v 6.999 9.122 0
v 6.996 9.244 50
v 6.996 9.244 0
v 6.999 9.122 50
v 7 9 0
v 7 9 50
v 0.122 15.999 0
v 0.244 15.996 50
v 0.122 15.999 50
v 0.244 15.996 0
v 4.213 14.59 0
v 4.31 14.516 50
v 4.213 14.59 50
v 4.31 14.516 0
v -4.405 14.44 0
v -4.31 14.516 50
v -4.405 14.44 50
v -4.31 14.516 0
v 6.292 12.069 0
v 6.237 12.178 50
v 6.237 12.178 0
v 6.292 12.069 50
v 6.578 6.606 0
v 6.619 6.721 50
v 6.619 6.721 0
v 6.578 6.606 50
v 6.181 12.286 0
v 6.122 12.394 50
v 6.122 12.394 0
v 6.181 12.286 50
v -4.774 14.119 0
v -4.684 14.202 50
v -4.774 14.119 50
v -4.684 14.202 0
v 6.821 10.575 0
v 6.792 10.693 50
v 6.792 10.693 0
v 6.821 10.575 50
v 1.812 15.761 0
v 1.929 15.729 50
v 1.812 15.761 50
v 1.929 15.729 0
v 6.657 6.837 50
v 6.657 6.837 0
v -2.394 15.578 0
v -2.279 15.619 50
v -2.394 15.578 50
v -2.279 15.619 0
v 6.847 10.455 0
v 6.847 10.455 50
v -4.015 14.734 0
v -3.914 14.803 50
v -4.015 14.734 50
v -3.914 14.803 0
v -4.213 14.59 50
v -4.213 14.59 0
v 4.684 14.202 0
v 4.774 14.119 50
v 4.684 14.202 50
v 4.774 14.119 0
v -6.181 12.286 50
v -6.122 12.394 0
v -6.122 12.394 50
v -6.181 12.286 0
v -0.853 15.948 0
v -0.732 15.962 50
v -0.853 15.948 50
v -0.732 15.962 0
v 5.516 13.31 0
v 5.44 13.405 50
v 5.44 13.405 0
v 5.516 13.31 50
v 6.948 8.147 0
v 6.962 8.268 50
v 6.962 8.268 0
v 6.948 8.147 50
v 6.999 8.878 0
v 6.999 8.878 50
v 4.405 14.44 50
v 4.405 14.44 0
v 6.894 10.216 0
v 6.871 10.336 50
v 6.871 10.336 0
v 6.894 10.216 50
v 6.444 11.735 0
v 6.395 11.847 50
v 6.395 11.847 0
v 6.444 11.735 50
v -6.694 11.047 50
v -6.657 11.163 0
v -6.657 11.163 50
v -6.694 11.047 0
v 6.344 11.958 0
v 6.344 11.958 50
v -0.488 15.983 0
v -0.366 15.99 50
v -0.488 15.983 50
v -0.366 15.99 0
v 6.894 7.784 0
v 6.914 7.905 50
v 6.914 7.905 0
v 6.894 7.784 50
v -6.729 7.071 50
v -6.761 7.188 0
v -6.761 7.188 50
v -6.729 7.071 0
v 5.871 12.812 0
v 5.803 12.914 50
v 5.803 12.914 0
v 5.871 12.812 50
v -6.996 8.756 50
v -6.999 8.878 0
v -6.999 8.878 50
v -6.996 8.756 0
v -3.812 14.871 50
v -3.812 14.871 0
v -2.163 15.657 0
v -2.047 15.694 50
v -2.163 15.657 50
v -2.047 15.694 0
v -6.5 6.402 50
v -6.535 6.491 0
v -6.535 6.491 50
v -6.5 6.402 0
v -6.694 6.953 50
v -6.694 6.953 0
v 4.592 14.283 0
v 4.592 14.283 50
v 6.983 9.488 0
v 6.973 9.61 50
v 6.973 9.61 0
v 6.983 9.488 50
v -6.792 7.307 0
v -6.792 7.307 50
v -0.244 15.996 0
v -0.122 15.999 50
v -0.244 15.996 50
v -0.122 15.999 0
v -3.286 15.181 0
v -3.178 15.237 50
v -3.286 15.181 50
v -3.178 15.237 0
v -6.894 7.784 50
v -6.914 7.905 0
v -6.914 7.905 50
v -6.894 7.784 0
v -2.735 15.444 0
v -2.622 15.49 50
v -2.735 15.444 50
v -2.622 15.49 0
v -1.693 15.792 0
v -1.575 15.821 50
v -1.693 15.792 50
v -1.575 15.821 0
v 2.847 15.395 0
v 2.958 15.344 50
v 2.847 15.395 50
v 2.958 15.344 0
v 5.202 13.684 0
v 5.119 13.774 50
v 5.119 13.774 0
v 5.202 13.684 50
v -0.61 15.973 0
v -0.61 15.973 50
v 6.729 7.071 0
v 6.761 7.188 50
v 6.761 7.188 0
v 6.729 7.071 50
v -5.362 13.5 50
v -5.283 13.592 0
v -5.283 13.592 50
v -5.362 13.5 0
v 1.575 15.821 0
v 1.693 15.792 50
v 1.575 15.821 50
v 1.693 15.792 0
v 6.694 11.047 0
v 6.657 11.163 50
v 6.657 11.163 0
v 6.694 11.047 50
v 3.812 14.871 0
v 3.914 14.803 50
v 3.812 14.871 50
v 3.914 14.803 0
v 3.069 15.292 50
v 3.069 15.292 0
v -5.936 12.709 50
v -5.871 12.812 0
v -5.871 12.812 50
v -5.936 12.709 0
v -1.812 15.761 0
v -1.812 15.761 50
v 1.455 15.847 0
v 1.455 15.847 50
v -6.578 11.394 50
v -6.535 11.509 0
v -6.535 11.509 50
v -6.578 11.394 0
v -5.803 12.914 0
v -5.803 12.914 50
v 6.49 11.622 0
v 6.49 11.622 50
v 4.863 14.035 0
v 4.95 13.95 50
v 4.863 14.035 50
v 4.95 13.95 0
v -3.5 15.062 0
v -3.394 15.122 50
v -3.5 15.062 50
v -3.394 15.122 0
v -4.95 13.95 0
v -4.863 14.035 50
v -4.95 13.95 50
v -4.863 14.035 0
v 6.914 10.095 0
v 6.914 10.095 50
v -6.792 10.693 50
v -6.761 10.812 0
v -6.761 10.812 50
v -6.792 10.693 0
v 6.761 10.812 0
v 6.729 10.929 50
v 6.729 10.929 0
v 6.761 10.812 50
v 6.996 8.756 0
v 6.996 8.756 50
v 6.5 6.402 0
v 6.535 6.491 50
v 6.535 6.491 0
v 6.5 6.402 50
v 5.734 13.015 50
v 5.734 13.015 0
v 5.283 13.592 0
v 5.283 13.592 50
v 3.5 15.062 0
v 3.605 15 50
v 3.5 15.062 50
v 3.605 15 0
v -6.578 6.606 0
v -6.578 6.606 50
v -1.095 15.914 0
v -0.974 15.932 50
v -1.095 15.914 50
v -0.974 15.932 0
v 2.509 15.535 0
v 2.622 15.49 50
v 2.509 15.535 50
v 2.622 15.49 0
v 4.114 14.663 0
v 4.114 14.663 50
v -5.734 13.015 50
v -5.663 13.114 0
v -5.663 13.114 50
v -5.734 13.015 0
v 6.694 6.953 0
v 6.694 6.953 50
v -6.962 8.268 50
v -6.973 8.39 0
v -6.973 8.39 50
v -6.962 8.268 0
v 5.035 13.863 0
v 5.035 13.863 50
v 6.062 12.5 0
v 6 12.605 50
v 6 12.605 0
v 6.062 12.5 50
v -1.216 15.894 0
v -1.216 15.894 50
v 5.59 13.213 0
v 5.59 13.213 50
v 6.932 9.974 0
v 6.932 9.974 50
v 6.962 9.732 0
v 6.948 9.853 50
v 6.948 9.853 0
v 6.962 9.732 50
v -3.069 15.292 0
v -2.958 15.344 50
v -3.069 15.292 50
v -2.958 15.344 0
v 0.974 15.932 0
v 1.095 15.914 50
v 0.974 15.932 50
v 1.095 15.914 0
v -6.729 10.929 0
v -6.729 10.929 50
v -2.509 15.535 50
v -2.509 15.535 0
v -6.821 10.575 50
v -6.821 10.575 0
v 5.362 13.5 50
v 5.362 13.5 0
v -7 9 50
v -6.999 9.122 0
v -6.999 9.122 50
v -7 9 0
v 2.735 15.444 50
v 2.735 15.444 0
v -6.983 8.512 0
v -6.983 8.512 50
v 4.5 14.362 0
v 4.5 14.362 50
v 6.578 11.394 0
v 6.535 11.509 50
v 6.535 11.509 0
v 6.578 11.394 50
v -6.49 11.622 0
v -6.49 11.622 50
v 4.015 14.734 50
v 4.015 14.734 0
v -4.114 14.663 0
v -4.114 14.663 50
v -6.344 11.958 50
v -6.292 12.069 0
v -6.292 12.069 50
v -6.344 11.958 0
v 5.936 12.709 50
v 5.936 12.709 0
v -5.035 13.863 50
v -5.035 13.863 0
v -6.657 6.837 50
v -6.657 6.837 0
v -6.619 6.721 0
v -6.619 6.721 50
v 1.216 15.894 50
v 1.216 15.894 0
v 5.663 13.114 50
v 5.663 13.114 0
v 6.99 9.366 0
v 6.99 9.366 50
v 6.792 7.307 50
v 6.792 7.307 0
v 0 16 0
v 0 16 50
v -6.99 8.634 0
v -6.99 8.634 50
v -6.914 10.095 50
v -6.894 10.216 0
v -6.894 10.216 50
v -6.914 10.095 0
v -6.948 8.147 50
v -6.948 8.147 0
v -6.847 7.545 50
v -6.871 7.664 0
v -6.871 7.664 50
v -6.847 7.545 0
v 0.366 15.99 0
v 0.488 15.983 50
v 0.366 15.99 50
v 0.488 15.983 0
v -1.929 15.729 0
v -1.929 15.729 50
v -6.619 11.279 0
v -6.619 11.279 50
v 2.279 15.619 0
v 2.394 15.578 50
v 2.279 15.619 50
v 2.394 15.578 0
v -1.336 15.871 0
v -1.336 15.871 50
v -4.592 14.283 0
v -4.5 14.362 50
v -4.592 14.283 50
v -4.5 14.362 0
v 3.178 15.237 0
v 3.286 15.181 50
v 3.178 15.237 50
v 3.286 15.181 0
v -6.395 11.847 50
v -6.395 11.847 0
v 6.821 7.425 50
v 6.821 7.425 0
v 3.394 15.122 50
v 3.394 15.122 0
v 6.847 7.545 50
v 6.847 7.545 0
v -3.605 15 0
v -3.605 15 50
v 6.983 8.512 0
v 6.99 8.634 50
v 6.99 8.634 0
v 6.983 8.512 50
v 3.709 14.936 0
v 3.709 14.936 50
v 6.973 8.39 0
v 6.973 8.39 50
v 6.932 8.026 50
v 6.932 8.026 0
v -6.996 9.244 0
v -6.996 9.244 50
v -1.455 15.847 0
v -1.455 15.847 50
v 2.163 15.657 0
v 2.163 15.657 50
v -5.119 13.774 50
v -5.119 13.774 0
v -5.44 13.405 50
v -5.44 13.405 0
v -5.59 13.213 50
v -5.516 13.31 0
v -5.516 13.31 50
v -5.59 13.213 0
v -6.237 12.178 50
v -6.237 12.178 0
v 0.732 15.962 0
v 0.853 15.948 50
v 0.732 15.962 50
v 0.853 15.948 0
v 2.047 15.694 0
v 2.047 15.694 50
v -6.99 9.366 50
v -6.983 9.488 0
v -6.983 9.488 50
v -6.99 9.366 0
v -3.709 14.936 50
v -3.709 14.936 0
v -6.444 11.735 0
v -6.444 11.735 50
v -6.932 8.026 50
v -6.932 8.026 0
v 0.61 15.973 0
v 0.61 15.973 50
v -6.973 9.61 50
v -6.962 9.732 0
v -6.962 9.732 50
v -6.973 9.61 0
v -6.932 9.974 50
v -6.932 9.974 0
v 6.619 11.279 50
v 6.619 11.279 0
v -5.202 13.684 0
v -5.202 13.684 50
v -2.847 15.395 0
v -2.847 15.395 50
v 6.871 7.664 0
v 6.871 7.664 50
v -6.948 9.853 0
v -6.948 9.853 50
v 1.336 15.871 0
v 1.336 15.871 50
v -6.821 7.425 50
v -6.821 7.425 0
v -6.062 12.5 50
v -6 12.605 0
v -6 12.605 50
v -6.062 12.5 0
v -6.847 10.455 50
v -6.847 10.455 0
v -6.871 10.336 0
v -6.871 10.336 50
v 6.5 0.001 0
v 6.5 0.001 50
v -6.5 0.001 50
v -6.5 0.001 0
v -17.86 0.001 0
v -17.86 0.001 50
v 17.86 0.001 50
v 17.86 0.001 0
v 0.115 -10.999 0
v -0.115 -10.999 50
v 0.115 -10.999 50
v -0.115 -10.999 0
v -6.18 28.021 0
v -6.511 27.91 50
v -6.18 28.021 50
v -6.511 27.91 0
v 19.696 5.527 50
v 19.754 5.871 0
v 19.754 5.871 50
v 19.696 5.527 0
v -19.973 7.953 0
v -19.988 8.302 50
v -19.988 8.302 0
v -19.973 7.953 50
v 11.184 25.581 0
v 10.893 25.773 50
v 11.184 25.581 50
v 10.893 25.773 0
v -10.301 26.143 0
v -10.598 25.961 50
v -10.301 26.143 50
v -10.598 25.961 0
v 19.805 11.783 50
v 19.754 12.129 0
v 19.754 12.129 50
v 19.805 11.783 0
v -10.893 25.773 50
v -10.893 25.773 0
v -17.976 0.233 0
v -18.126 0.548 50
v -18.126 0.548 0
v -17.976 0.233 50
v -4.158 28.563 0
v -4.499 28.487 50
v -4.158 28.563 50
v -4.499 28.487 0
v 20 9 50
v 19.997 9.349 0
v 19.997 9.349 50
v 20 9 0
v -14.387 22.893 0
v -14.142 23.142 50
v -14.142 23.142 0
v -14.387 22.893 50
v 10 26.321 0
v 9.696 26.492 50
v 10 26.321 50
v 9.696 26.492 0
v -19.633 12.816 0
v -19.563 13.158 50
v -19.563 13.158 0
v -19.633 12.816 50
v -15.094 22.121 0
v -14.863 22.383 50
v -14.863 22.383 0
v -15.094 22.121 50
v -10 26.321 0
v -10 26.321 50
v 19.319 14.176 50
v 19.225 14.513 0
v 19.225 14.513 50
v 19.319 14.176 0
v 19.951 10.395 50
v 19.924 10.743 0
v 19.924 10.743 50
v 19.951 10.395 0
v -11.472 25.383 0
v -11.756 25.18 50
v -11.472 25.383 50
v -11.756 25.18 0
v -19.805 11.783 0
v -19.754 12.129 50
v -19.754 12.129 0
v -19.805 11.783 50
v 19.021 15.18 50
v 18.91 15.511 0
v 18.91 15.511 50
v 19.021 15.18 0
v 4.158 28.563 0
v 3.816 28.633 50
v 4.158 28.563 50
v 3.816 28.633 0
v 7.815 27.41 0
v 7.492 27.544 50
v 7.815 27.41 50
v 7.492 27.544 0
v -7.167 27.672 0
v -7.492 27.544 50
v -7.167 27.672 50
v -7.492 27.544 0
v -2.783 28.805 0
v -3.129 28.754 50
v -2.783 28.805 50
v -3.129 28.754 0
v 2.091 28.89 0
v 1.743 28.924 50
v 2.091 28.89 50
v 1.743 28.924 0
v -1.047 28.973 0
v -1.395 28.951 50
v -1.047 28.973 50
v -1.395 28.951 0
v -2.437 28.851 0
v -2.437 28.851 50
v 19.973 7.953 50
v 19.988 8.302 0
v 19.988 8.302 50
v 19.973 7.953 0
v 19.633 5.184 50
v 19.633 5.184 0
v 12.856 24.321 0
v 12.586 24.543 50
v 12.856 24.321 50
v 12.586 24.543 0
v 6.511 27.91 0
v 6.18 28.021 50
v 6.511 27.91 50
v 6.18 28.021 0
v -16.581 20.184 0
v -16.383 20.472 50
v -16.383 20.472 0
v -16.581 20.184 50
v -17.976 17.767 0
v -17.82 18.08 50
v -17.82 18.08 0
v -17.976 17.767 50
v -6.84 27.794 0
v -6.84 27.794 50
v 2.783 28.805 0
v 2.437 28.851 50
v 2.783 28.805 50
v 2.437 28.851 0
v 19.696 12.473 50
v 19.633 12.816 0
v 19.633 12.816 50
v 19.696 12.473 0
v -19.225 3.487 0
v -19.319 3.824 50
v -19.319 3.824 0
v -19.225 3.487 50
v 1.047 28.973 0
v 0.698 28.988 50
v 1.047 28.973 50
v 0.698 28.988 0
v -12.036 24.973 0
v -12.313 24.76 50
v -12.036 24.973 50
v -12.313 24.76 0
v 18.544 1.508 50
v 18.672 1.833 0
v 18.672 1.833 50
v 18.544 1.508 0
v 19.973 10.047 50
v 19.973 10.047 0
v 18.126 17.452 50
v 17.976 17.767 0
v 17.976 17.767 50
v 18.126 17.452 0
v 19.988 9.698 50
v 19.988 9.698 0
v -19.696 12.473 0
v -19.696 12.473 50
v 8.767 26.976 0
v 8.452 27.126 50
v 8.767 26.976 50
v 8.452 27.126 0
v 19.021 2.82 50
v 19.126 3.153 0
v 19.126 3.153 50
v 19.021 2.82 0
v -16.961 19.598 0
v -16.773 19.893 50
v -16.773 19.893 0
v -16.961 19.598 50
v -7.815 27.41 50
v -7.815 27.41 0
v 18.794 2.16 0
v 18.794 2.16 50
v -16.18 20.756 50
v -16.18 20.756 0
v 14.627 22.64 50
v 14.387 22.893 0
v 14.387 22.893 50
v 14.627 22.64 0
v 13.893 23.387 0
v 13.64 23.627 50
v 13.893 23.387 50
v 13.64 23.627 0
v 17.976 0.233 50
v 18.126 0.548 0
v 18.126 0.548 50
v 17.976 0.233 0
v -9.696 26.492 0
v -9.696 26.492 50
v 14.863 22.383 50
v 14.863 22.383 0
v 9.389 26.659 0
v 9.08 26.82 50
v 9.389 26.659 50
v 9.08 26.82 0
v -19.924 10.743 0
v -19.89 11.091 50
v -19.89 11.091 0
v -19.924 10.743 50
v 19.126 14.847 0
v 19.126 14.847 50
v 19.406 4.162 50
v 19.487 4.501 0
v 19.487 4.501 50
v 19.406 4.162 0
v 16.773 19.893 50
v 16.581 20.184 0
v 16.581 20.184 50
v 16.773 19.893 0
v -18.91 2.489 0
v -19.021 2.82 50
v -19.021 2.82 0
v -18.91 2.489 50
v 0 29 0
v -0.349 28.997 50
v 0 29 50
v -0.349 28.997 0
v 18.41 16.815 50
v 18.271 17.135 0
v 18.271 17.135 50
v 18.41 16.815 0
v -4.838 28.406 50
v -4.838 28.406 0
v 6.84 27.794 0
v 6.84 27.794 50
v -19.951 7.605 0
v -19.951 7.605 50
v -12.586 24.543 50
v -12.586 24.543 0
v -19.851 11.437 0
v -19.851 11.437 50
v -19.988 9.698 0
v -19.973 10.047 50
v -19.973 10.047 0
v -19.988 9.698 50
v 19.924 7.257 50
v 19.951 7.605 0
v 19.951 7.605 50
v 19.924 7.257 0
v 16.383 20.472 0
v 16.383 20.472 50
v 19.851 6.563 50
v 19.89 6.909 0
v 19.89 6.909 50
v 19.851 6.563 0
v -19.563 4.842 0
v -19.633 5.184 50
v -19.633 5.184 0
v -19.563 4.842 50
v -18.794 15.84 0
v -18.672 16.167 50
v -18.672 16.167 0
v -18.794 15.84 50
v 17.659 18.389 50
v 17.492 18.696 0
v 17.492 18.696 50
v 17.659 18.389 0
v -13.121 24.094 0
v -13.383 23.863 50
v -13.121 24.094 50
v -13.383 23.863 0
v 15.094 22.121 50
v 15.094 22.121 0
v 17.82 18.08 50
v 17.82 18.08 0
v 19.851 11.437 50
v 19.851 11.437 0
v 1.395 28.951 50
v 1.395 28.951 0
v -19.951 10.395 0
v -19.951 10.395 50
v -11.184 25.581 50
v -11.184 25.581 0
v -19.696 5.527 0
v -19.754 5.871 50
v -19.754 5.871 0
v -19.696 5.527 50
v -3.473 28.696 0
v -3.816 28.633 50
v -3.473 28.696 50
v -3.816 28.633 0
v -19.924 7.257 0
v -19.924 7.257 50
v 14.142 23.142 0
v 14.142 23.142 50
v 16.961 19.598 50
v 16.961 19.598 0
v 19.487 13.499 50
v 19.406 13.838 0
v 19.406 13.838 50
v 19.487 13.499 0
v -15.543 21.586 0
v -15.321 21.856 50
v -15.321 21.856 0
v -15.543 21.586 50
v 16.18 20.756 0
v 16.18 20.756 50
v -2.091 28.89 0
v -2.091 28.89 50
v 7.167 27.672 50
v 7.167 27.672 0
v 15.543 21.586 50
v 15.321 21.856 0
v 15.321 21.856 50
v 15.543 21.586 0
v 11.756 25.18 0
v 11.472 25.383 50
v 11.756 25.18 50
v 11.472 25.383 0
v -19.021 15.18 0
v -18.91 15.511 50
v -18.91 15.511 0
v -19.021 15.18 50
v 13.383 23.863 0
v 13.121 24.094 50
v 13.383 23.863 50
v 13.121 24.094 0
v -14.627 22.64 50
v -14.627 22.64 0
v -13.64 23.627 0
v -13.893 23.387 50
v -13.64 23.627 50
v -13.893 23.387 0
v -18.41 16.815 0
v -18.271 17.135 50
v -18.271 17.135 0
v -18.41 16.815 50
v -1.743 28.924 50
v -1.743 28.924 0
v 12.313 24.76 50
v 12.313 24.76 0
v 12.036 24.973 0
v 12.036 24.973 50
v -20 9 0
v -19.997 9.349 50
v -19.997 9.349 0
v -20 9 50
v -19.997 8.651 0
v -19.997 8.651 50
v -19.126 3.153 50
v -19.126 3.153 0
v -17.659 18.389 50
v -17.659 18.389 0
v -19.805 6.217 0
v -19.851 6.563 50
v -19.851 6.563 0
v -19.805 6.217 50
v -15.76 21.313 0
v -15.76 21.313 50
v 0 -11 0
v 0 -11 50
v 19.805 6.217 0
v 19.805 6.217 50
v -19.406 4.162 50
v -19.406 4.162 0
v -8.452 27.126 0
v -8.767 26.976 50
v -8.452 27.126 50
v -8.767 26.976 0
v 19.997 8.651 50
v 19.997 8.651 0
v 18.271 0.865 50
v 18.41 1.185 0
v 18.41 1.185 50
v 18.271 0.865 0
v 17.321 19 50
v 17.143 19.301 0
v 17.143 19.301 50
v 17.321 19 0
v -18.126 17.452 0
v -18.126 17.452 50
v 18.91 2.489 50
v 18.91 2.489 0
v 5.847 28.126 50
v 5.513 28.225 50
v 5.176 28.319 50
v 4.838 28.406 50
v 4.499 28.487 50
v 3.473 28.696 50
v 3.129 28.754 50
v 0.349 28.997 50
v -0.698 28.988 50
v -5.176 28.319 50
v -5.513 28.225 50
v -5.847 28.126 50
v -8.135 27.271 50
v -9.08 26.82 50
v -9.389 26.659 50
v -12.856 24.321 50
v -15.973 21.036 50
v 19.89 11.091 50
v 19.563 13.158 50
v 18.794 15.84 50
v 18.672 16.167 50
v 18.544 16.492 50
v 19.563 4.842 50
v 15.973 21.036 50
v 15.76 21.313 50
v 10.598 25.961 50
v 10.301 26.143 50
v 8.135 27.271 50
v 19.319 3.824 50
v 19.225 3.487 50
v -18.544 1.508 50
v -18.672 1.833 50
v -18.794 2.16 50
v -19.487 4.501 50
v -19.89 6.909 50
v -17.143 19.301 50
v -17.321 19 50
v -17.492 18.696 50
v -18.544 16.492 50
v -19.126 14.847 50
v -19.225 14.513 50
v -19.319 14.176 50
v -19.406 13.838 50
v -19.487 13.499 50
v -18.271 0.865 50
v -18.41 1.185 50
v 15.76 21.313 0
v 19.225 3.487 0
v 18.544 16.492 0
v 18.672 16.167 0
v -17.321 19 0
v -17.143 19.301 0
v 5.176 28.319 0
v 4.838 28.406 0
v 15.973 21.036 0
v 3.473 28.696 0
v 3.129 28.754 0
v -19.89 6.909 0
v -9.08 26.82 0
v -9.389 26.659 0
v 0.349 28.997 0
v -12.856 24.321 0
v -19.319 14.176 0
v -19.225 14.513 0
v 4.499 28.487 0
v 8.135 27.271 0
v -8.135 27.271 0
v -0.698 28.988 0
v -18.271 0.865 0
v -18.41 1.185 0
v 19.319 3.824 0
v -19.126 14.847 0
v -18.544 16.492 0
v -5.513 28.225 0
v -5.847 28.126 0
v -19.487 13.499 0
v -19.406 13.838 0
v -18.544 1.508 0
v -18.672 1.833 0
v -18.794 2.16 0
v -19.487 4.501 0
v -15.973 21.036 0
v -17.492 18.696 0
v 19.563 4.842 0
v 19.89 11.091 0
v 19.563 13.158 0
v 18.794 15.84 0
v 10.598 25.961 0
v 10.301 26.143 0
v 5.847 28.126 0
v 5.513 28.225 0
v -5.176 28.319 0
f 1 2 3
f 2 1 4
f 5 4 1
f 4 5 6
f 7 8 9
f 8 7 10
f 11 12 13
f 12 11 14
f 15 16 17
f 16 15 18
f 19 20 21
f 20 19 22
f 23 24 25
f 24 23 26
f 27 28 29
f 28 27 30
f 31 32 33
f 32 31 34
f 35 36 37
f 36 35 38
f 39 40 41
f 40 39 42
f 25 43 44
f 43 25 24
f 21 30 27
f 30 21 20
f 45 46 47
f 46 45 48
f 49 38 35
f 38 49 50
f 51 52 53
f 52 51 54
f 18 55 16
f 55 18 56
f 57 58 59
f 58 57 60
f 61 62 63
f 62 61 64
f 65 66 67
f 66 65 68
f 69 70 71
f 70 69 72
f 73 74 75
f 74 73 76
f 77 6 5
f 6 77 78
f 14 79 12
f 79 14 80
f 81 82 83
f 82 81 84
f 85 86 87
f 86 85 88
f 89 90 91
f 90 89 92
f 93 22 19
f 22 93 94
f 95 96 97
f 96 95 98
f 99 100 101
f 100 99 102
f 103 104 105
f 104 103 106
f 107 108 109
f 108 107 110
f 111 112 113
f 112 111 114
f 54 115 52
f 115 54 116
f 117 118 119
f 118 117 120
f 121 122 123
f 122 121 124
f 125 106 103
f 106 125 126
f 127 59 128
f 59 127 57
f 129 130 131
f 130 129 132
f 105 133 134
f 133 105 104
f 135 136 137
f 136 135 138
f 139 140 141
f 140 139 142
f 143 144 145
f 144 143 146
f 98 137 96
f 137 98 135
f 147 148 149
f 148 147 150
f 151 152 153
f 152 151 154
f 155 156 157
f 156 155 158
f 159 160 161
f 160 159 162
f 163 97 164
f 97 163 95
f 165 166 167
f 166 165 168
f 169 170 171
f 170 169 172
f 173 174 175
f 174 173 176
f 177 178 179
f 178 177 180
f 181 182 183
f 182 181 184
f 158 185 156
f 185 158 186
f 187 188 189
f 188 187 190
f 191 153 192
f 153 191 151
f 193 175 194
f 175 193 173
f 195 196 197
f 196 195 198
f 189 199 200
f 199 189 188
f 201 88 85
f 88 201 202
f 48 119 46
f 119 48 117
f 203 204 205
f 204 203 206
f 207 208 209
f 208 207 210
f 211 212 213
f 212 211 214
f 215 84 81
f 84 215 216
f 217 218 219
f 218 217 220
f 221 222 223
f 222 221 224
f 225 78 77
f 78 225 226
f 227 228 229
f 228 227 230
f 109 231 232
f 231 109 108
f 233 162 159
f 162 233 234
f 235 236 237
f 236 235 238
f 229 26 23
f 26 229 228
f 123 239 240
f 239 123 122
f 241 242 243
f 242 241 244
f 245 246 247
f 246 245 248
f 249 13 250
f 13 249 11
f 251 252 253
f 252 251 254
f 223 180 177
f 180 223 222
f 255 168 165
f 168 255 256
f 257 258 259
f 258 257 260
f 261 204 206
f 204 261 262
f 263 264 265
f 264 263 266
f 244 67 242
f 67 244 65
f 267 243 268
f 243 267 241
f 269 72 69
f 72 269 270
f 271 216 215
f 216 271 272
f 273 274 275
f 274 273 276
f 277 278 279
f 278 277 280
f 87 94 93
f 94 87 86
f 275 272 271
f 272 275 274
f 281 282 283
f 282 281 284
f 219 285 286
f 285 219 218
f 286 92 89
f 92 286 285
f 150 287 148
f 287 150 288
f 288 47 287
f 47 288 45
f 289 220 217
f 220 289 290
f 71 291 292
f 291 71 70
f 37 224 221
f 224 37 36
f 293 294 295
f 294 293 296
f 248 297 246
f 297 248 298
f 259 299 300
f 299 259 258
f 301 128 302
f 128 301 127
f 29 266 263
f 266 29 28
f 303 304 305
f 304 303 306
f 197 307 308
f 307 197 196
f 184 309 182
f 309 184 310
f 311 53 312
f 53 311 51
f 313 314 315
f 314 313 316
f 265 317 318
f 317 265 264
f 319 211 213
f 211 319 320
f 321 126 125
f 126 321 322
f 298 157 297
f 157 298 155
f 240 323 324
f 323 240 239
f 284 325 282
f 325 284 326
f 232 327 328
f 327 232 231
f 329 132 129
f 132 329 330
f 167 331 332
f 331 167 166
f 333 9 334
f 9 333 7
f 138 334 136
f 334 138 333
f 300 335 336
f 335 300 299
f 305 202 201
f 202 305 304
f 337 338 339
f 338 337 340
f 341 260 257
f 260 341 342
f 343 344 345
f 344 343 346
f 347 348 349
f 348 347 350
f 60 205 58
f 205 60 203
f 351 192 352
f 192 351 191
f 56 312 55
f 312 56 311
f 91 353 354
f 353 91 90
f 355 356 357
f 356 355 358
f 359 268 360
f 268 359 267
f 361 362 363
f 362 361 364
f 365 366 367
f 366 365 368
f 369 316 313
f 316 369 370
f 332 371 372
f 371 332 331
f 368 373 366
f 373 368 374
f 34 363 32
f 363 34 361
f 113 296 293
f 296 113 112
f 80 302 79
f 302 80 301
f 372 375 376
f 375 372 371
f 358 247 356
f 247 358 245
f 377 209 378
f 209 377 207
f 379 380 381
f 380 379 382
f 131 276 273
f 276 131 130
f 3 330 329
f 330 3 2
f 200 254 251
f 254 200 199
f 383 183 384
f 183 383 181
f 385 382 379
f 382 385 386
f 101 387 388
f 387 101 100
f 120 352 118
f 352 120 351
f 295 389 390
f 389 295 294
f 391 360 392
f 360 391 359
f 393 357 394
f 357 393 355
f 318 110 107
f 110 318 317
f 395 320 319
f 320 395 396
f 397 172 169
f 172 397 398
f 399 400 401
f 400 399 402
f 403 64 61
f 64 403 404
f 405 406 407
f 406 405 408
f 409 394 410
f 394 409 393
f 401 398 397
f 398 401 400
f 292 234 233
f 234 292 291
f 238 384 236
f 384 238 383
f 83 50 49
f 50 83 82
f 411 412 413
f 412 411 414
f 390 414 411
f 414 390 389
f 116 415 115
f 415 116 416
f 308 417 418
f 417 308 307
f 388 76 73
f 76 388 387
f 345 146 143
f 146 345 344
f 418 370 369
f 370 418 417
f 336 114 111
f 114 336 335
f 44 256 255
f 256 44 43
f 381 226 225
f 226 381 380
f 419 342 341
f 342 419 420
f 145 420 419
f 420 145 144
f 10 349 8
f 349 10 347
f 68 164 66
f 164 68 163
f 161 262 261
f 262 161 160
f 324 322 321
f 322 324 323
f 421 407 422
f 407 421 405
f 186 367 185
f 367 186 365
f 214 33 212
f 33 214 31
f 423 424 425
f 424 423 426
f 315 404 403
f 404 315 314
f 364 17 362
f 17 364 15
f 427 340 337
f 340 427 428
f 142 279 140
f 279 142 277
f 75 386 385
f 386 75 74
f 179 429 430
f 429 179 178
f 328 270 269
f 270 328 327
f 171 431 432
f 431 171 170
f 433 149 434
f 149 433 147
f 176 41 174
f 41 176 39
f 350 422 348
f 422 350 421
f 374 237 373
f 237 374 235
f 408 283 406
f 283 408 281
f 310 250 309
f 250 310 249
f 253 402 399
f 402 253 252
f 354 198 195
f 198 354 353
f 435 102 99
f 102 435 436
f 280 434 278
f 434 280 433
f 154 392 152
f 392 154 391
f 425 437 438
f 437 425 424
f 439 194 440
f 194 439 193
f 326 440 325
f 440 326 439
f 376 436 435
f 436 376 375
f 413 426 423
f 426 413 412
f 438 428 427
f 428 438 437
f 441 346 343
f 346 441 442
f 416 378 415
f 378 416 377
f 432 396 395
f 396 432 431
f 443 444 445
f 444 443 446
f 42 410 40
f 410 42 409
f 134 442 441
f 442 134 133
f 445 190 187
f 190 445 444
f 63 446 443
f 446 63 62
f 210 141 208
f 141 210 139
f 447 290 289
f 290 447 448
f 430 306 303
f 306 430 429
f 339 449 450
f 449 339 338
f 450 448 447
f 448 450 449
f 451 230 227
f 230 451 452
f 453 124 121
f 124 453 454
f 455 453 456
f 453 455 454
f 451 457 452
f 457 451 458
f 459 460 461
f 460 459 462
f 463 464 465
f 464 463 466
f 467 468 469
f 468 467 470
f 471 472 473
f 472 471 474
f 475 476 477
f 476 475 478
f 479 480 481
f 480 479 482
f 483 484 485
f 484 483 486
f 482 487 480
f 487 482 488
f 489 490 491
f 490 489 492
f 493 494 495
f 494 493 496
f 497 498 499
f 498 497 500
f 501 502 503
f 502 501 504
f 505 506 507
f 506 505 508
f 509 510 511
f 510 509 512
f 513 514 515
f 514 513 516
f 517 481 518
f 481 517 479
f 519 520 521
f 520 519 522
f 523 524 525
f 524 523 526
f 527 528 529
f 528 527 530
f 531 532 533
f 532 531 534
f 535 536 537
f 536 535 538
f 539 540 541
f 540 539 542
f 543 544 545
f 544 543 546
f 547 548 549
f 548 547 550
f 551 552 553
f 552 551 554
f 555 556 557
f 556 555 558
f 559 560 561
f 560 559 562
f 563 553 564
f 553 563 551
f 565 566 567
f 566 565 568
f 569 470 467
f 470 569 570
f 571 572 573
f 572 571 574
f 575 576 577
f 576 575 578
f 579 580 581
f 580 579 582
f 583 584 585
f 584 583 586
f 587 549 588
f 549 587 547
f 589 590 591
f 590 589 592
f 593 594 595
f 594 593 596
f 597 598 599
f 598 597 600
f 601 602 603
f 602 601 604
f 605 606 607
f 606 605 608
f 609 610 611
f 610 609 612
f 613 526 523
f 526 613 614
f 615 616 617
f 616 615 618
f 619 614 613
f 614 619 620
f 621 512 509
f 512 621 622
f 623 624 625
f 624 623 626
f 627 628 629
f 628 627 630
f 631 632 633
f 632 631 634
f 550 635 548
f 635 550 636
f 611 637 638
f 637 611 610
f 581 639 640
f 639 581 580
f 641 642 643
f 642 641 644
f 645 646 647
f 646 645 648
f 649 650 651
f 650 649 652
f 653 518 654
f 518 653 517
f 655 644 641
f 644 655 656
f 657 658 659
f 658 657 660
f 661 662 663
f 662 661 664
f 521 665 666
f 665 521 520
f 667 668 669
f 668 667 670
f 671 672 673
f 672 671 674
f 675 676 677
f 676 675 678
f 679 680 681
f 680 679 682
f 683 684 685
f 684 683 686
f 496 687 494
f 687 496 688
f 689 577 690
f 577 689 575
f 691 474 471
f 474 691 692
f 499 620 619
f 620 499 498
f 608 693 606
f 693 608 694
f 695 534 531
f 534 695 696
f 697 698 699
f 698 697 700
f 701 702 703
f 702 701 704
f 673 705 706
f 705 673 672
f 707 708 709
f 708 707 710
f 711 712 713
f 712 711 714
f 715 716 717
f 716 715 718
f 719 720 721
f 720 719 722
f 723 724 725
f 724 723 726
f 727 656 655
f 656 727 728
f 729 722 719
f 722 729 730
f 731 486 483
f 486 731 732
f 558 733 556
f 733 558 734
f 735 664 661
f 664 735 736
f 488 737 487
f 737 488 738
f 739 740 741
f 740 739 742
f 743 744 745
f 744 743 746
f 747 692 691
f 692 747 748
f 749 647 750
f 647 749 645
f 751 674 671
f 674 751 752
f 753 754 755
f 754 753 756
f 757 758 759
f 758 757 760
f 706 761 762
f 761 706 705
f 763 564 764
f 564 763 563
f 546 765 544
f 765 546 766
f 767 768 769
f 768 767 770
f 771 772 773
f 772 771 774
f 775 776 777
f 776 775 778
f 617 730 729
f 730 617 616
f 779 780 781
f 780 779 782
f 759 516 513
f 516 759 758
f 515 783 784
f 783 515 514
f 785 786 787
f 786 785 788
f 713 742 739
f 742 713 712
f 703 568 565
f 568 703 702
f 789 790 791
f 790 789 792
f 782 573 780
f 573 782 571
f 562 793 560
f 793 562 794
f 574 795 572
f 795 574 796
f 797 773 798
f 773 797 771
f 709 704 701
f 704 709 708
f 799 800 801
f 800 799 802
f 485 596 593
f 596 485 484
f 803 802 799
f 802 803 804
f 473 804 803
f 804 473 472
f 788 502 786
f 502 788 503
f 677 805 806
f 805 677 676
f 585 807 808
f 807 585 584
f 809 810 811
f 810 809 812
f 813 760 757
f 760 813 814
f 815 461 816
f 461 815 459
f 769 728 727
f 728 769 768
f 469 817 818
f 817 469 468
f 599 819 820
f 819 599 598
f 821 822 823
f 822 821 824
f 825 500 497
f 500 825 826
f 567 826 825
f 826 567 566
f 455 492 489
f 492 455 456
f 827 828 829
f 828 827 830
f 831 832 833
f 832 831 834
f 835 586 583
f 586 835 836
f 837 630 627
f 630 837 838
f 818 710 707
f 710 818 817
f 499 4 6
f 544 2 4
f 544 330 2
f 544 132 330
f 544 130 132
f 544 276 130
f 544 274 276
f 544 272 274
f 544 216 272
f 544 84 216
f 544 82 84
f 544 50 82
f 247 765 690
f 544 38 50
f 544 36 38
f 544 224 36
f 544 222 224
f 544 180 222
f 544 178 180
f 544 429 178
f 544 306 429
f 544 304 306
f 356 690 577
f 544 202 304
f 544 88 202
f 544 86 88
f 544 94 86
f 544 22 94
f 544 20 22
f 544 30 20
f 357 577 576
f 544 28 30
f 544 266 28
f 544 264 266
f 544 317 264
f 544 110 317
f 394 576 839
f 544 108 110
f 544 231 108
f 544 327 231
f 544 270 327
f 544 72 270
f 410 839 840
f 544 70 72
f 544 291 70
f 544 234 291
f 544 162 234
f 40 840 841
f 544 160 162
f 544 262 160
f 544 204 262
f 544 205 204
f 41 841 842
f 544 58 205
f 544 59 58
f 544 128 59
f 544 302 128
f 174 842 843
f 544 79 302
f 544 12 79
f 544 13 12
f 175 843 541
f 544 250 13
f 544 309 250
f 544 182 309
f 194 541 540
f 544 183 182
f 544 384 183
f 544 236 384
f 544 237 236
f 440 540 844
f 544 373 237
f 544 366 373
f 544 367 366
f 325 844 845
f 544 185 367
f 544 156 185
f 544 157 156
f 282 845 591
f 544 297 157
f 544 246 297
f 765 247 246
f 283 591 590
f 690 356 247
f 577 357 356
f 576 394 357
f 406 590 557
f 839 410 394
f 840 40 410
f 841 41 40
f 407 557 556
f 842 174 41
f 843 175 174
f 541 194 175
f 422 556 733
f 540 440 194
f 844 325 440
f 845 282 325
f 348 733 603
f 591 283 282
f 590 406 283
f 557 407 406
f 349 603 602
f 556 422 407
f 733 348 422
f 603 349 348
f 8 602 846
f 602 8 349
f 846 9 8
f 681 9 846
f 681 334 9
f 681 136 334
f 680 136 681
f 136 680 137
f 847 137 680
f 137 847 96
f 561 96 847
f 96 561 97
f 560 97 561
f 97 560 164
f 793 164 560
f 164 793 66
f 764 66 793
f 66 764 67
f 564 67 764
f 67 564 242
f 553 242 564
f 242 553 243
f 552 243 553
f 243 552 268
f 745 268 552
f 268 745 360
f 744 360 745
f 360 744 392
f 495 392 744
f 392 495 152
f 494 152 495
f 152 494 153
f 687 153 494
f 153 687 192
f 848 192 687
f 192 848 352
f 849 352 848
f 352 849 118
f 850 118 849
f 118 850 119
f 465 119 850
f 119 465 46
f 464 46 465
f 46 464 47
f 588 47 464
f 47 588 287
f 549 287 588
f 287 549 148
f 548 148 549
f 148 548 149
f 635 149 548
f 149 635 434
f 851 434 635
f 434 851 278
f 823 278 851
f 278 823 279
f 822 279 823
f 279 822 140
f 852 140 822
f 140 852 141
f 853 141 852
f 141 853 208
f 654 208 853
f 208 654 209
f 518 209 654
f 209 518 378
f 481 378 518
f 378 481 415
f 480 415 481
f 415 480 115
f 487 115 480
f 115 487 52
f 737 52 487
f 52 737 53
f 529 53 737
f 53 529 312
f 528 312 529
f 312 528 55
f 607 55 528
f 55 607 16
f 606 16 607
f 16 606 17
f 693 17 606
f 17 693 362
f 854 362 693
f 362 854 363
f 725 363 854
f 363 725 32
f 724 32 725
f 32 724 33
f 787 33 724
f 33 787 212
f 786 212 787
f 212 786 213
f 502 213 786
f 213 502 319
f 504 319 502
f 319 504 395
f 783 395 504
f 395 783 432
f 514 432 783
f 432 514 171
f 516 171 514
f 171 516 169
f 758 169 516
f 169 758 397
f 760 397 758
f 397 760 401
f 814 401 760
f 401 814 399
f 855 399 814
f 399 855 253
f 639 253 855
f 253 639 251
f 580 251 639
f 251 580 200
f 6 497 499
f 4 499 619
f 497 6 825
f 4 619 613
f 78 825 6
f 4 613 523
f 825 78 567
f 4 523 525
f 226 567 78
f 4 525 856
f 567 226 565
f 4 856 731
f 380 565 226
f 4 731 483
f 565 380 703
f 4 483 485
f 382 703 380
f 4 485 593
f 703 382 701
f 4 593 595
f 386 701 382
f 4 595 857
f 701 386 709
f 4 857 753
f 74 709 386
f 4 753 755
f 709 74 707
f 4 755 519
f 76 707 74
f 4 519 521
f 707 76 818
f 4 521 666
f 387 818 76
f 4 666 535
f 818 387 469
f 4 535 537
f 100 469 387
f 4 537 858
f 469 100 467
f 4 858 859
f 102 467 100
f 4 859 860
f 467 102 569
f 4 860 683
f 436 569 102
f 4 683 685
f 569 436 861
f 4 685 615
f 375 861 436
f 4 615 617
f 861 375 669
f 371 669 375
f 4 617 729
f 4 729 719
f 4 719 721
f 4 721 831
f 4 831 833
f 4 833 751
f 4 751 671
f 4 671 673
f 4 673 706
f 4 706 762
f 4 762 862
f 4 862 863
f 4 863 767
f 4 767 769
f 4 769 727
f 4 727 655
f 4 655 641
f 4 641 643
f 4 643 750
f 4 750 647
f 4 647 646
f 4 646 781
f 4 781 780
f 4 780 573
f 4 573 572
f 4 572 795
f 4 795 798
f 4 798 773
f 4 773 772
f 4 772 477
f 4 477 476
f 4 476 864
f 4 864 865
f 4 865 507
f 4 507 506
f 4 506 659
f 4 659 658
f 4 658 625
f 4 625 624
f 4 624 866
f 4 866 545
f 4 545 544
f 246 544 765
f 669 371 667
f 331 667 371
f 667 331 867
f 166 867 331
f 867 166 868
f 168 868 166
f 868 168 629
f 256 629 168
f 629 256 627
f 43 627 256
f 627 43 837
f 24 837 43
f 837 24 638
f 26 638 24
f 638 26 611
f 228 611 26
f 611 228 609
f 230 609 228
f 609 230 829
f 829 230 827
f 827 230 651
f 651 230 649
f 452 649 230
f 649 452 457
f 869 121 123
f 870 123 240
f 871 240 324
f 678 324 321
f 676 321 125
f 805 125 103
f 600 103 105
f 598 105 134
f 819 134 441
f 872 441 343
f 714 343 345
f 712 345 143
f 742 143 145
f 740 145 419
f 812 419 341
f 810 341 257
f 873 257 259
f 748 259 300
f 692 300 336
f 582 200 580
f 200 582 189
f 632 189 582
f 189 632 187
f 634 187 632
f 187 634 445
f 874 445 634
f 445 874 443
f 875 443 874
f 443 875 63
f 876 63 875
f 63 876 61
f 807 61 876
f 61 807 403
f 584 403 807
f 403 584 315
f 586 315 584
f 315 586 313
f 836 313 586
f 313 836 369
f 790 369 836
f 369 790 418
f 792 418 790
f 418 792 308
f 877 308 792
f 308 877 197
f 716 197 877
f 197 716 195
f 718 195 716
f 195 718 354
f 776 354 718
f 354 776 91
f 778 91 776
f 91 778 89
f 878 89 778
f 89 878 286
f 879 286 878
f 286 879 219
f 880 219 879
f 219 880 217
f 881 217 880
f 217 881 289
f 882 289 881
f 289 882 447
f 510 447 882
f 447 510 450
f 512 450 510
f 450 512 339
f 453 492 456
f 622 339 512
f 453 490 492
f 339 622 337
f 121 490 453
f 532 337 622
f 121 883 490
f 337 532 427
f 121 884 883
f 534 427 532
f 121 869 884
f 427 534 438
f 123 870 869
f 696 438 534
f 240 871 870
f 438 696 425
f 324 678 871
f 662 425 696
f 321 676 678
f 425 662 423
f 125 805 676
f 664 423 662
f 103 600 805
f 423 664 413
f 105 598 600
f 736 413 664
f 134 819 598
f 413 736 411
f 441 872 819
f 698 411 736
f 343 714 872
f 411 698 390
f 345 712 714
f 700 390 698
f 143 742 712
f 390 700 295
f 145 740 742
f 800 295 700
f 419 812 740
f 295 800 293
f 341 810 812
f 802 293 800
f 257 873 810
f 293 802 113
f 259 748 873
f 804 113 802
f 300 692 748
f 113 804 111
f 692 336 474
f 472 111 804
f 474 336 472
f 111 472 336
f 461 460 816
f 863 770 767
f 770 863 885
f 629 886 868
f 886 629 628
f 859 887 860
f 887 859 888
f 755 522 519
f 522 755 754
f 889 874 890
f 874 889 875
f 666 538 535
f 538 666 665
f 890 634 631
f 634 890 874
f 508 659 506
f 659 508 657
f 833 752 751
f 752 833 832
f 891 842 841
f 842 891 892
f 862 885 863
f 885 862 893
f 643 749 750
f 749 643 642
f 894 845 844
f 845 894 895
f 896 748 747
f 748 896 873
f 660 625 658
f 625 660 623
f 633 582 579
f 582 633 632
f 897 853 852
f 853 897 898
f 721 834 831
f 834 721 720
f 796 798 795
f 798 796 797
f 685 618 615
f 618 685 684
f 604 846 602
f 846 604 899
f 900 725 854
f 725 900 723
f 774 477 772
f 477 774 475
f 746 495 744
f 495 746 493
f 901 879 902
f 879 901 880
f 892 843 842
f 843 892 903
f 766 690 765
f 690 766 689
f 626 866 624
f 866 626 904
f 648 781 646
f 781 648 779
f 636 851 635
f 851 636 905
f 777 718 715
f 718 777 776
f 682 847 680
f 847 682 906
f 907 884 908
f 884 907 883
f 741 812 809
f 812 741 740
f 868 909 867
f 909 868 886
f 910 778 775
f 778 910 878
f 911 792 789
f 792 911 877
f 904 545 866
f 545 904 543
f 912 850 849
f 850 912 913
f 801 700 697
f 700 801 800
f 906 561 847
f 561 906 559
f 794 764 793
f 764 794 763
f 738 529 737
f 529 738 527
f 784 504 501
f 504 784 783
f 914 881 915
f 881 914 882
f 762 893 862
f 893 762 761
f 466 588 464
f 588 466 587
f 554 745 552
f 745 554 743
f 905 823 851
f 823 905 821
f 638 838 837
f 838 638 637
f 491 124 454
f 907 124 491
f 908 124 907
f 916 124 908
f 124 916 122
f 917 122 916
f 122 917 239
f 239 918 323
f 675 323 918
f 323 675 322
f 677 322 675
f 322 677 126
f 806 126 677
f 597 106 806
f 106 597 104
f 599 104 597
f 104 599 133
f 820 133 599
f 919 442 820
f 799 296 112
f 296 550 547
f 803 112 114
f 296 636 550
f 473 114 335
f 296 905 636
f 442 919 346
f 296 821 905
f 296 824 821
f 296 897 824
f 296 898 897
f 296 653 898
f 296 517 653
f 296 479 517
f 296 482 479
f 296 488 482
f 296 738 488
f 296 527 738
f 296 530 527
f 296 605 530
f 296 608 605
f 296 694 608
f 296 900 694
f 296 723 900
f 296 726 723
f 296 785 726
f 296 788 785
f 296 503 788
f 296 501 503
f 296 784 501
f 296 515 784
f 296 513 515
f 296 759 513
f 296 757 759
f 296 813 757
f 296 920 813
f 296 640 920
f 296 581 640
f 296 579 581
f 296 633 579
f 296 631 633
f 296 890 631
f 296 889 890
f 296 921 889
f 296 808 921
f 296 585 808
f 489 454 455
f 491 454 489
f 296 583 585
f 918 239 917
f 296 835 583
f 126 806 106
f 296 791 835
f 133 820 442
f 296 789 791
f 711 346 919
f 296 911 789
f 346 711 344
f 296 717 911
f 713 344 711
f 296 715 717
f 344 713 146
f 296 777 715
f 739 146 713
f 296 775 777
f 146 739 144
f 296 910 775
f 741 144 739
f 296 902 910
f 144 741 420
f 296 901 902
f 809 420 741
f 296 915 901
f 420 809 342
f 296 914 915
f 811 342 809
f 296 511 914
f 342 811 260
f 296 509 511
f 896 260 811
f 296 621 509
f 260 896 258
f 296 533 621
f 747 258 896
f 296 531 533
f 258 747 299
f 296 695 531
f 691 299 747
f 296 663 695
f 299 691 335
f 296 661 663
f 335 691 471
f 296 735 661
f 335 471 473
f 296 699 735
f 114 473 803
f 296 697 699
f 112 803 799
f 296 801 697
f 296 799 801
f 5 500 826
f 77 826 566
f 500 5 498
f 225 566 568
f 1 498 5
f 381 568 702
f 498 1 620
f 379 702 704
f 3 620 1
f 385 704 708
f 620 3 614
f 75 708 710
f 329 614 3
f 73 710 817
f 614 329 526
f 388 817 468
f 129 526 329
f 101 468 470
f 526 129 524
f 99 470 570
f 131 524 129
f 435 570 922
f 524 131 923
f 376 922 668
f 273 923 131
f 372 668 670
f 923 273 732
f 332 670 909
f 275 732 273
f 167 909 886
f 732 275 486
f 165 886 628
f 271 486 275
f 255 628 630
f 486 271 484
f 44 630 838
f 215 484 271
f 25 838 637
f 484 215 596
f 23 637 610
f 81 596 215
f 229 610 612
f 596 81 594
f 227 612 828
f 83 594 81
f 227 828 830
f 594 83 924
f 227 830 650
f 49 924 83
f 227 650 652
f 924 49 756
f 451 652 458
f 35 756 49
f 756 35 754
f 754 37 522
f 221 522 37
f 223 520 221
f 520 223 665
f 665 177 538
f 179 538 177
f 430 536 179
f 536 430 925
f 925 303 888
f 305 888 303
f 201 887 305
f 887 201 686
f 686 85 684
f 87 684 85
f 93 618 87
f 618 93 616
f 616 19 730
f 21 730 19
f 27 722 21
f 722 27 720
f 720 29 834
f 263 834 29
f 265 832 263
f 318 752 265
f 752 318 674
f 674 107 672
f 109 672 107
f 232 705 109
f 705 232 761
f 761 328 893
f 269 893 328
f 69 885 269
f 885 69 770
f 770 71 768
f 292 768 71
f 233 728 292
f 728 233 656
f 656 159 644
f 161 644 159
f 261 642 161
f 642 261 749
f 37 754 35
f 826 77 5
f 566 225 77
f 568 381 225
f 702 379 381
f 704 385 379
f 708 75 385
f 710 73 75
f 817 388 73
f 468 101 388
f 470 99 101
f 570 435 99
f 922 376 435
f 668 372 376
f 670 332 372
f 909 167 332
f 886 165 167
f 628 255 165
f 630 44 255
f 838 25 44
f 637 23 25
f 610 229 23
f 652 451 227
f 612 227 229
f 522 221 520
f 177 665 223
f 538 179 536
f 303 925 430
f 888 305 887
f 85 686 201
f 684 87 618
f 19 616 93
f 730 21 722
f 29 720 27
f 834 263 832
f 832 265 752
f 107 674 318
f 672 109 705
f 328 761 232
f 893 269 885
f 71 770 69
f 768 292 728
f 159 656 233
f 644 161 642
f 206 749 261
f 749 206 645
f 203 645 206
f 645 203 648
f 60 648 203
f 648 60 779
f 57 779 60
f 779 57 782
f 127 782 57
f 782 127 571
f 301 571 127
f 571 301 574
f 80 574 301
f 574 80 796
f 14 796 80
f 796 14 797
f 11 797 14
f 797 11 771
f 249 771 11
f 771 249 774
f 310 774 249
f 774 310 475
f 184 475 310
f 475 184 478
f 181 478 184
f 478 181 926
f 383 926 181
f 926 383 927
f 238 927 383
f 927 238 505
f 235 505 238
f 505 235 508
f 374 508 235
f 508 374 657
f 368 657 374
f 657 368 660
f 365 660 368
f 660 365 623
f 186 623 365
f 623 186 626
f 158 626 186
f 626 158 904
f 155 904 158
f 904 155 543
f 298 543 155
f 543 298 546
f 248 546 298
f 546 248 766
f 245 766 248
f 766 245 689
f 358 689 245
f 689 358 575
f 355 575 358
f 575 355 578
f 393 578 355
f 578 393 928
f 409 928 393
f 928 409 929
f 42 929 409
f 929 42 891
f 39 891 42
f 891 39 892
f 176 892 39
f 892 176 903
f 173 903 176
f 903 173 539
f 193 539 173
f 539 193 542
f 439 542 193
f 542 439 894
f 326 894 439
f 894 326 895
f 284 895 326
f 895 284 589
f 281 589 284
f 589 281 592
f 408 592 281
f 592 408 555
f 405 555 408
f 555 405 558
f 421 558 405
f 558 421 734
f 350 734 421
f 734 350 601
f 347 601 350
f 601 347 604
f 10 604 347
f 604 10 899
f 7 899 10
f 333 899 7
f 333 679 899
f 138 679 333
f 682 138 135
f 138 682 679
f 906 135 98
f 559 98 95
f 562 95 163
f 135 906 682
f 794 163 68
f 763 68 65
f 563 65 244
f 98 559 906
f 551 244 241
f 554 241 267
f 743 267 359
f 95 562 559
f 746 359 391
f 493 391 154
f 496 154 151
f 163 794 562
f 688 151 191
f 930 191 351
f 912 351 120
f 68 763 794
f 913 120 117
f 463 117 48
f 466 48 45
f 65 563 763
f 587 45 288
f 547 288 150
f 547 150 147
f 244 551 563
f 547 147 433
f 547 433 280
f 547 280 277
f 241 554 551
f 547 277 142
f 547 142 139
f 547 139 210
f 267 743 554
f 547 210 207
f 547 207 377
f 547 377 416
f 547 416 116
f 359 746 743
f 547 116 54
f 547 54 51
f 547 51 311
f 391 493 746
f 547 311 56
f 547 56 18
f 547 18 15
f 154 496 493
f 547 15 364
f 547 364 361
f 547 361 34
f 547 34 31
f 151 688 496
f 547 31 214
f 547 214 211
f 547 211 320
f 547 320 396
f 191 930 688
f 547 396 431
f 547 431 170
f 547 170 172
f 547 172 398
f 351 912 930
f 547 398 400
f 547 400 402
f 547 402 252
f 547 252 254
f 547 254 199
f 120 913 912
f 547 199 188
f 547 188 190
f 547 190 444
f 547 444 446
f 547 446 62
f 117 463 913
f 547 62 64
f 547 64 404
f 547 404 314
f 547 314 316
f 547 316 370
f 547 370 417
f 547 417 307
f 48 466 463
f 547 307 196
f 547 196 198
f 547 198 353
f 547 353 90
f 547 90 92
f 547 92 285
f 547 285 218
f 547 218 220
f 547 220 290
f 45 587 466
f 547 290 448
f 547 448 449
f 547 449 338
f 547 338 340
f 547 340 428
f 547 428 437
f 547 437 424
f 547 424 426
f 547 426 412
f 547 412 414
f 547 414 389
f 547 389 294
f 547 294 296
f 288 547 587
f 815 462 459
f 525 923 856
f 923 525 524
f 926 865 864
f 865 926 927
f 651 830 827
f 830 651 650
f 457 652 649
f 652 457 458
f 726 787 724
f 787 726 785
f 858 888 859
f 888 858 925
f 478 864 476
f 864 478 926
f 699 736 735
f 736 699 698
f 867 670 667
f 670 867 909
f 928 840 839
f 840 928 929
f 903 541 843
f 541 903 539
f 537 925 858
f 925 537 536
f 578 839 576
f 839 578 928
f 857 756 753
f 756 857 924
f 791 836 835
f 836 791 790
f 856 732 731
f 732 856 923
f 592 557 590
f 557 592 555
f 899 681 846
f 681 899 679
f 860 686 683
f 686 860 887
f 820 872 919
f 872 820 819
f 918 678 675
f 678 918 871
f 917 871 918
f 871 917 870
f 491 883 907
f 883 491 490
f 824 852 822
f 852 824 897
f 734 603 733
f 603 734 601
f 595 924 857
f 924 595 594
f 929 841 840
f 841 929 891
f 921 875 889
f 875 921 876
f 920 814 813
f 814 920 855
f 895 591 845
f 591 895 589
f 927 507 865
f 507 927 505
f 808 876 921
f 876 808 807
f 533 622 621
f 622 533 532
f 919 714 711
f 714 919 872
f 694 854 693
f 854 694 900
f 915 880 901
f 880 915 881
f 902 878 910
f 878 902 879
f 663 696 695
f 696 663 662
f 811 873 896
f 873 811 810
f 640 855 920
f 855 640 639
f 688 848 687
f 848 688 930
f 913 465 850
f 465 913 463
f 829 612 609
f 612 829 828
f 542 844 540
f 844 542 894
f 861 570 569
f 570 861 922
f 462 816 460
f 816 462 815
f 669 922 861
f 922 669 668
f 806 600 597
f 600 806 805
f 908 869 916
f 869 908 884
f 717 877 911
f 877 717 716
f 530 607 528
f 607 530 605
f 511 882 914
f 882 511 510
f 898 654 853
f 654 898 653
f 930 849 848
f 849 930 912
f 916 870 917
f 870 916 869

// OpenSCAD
// Chair Stop

eps = 0.001;
eps2 = eps * 2;
$fa = 1.0;
$fs = 0.1;

gap_r = 7;
outter_r = 20;
gap_y = 2;
latch_w = 0.5;
item_h = 50;

difference() {
  // Main
  translate([0, gap_y + gap_r, 0])
    cylinder(h=item_h, r=outter_r);

  // hole and cut
  union() {
    // inside hole
    color("red") {
      translate([0, gap_y + gap_r, -eps])
        cylinder(h=item_h + eps2, r=gap_r);

      gap_x = -(gap_r - latch_w);
      translate([gap_x, 0, -eps])
        cube([(gap_r - latch_w) * 2, gap_r, item_h + eps2]);
    }

    // Cut
    color("blue") {
      cut_d = outter_r - (gap_y + gap_r);
      cut_w = outter_r * 2;
      cut_y = -cut_w / 2 - eps;
      translate([cut_y, -cut_d + eps, -eps])
        cube([cut_w, cut_d, item_h + eps2]);
    }
  }
}
